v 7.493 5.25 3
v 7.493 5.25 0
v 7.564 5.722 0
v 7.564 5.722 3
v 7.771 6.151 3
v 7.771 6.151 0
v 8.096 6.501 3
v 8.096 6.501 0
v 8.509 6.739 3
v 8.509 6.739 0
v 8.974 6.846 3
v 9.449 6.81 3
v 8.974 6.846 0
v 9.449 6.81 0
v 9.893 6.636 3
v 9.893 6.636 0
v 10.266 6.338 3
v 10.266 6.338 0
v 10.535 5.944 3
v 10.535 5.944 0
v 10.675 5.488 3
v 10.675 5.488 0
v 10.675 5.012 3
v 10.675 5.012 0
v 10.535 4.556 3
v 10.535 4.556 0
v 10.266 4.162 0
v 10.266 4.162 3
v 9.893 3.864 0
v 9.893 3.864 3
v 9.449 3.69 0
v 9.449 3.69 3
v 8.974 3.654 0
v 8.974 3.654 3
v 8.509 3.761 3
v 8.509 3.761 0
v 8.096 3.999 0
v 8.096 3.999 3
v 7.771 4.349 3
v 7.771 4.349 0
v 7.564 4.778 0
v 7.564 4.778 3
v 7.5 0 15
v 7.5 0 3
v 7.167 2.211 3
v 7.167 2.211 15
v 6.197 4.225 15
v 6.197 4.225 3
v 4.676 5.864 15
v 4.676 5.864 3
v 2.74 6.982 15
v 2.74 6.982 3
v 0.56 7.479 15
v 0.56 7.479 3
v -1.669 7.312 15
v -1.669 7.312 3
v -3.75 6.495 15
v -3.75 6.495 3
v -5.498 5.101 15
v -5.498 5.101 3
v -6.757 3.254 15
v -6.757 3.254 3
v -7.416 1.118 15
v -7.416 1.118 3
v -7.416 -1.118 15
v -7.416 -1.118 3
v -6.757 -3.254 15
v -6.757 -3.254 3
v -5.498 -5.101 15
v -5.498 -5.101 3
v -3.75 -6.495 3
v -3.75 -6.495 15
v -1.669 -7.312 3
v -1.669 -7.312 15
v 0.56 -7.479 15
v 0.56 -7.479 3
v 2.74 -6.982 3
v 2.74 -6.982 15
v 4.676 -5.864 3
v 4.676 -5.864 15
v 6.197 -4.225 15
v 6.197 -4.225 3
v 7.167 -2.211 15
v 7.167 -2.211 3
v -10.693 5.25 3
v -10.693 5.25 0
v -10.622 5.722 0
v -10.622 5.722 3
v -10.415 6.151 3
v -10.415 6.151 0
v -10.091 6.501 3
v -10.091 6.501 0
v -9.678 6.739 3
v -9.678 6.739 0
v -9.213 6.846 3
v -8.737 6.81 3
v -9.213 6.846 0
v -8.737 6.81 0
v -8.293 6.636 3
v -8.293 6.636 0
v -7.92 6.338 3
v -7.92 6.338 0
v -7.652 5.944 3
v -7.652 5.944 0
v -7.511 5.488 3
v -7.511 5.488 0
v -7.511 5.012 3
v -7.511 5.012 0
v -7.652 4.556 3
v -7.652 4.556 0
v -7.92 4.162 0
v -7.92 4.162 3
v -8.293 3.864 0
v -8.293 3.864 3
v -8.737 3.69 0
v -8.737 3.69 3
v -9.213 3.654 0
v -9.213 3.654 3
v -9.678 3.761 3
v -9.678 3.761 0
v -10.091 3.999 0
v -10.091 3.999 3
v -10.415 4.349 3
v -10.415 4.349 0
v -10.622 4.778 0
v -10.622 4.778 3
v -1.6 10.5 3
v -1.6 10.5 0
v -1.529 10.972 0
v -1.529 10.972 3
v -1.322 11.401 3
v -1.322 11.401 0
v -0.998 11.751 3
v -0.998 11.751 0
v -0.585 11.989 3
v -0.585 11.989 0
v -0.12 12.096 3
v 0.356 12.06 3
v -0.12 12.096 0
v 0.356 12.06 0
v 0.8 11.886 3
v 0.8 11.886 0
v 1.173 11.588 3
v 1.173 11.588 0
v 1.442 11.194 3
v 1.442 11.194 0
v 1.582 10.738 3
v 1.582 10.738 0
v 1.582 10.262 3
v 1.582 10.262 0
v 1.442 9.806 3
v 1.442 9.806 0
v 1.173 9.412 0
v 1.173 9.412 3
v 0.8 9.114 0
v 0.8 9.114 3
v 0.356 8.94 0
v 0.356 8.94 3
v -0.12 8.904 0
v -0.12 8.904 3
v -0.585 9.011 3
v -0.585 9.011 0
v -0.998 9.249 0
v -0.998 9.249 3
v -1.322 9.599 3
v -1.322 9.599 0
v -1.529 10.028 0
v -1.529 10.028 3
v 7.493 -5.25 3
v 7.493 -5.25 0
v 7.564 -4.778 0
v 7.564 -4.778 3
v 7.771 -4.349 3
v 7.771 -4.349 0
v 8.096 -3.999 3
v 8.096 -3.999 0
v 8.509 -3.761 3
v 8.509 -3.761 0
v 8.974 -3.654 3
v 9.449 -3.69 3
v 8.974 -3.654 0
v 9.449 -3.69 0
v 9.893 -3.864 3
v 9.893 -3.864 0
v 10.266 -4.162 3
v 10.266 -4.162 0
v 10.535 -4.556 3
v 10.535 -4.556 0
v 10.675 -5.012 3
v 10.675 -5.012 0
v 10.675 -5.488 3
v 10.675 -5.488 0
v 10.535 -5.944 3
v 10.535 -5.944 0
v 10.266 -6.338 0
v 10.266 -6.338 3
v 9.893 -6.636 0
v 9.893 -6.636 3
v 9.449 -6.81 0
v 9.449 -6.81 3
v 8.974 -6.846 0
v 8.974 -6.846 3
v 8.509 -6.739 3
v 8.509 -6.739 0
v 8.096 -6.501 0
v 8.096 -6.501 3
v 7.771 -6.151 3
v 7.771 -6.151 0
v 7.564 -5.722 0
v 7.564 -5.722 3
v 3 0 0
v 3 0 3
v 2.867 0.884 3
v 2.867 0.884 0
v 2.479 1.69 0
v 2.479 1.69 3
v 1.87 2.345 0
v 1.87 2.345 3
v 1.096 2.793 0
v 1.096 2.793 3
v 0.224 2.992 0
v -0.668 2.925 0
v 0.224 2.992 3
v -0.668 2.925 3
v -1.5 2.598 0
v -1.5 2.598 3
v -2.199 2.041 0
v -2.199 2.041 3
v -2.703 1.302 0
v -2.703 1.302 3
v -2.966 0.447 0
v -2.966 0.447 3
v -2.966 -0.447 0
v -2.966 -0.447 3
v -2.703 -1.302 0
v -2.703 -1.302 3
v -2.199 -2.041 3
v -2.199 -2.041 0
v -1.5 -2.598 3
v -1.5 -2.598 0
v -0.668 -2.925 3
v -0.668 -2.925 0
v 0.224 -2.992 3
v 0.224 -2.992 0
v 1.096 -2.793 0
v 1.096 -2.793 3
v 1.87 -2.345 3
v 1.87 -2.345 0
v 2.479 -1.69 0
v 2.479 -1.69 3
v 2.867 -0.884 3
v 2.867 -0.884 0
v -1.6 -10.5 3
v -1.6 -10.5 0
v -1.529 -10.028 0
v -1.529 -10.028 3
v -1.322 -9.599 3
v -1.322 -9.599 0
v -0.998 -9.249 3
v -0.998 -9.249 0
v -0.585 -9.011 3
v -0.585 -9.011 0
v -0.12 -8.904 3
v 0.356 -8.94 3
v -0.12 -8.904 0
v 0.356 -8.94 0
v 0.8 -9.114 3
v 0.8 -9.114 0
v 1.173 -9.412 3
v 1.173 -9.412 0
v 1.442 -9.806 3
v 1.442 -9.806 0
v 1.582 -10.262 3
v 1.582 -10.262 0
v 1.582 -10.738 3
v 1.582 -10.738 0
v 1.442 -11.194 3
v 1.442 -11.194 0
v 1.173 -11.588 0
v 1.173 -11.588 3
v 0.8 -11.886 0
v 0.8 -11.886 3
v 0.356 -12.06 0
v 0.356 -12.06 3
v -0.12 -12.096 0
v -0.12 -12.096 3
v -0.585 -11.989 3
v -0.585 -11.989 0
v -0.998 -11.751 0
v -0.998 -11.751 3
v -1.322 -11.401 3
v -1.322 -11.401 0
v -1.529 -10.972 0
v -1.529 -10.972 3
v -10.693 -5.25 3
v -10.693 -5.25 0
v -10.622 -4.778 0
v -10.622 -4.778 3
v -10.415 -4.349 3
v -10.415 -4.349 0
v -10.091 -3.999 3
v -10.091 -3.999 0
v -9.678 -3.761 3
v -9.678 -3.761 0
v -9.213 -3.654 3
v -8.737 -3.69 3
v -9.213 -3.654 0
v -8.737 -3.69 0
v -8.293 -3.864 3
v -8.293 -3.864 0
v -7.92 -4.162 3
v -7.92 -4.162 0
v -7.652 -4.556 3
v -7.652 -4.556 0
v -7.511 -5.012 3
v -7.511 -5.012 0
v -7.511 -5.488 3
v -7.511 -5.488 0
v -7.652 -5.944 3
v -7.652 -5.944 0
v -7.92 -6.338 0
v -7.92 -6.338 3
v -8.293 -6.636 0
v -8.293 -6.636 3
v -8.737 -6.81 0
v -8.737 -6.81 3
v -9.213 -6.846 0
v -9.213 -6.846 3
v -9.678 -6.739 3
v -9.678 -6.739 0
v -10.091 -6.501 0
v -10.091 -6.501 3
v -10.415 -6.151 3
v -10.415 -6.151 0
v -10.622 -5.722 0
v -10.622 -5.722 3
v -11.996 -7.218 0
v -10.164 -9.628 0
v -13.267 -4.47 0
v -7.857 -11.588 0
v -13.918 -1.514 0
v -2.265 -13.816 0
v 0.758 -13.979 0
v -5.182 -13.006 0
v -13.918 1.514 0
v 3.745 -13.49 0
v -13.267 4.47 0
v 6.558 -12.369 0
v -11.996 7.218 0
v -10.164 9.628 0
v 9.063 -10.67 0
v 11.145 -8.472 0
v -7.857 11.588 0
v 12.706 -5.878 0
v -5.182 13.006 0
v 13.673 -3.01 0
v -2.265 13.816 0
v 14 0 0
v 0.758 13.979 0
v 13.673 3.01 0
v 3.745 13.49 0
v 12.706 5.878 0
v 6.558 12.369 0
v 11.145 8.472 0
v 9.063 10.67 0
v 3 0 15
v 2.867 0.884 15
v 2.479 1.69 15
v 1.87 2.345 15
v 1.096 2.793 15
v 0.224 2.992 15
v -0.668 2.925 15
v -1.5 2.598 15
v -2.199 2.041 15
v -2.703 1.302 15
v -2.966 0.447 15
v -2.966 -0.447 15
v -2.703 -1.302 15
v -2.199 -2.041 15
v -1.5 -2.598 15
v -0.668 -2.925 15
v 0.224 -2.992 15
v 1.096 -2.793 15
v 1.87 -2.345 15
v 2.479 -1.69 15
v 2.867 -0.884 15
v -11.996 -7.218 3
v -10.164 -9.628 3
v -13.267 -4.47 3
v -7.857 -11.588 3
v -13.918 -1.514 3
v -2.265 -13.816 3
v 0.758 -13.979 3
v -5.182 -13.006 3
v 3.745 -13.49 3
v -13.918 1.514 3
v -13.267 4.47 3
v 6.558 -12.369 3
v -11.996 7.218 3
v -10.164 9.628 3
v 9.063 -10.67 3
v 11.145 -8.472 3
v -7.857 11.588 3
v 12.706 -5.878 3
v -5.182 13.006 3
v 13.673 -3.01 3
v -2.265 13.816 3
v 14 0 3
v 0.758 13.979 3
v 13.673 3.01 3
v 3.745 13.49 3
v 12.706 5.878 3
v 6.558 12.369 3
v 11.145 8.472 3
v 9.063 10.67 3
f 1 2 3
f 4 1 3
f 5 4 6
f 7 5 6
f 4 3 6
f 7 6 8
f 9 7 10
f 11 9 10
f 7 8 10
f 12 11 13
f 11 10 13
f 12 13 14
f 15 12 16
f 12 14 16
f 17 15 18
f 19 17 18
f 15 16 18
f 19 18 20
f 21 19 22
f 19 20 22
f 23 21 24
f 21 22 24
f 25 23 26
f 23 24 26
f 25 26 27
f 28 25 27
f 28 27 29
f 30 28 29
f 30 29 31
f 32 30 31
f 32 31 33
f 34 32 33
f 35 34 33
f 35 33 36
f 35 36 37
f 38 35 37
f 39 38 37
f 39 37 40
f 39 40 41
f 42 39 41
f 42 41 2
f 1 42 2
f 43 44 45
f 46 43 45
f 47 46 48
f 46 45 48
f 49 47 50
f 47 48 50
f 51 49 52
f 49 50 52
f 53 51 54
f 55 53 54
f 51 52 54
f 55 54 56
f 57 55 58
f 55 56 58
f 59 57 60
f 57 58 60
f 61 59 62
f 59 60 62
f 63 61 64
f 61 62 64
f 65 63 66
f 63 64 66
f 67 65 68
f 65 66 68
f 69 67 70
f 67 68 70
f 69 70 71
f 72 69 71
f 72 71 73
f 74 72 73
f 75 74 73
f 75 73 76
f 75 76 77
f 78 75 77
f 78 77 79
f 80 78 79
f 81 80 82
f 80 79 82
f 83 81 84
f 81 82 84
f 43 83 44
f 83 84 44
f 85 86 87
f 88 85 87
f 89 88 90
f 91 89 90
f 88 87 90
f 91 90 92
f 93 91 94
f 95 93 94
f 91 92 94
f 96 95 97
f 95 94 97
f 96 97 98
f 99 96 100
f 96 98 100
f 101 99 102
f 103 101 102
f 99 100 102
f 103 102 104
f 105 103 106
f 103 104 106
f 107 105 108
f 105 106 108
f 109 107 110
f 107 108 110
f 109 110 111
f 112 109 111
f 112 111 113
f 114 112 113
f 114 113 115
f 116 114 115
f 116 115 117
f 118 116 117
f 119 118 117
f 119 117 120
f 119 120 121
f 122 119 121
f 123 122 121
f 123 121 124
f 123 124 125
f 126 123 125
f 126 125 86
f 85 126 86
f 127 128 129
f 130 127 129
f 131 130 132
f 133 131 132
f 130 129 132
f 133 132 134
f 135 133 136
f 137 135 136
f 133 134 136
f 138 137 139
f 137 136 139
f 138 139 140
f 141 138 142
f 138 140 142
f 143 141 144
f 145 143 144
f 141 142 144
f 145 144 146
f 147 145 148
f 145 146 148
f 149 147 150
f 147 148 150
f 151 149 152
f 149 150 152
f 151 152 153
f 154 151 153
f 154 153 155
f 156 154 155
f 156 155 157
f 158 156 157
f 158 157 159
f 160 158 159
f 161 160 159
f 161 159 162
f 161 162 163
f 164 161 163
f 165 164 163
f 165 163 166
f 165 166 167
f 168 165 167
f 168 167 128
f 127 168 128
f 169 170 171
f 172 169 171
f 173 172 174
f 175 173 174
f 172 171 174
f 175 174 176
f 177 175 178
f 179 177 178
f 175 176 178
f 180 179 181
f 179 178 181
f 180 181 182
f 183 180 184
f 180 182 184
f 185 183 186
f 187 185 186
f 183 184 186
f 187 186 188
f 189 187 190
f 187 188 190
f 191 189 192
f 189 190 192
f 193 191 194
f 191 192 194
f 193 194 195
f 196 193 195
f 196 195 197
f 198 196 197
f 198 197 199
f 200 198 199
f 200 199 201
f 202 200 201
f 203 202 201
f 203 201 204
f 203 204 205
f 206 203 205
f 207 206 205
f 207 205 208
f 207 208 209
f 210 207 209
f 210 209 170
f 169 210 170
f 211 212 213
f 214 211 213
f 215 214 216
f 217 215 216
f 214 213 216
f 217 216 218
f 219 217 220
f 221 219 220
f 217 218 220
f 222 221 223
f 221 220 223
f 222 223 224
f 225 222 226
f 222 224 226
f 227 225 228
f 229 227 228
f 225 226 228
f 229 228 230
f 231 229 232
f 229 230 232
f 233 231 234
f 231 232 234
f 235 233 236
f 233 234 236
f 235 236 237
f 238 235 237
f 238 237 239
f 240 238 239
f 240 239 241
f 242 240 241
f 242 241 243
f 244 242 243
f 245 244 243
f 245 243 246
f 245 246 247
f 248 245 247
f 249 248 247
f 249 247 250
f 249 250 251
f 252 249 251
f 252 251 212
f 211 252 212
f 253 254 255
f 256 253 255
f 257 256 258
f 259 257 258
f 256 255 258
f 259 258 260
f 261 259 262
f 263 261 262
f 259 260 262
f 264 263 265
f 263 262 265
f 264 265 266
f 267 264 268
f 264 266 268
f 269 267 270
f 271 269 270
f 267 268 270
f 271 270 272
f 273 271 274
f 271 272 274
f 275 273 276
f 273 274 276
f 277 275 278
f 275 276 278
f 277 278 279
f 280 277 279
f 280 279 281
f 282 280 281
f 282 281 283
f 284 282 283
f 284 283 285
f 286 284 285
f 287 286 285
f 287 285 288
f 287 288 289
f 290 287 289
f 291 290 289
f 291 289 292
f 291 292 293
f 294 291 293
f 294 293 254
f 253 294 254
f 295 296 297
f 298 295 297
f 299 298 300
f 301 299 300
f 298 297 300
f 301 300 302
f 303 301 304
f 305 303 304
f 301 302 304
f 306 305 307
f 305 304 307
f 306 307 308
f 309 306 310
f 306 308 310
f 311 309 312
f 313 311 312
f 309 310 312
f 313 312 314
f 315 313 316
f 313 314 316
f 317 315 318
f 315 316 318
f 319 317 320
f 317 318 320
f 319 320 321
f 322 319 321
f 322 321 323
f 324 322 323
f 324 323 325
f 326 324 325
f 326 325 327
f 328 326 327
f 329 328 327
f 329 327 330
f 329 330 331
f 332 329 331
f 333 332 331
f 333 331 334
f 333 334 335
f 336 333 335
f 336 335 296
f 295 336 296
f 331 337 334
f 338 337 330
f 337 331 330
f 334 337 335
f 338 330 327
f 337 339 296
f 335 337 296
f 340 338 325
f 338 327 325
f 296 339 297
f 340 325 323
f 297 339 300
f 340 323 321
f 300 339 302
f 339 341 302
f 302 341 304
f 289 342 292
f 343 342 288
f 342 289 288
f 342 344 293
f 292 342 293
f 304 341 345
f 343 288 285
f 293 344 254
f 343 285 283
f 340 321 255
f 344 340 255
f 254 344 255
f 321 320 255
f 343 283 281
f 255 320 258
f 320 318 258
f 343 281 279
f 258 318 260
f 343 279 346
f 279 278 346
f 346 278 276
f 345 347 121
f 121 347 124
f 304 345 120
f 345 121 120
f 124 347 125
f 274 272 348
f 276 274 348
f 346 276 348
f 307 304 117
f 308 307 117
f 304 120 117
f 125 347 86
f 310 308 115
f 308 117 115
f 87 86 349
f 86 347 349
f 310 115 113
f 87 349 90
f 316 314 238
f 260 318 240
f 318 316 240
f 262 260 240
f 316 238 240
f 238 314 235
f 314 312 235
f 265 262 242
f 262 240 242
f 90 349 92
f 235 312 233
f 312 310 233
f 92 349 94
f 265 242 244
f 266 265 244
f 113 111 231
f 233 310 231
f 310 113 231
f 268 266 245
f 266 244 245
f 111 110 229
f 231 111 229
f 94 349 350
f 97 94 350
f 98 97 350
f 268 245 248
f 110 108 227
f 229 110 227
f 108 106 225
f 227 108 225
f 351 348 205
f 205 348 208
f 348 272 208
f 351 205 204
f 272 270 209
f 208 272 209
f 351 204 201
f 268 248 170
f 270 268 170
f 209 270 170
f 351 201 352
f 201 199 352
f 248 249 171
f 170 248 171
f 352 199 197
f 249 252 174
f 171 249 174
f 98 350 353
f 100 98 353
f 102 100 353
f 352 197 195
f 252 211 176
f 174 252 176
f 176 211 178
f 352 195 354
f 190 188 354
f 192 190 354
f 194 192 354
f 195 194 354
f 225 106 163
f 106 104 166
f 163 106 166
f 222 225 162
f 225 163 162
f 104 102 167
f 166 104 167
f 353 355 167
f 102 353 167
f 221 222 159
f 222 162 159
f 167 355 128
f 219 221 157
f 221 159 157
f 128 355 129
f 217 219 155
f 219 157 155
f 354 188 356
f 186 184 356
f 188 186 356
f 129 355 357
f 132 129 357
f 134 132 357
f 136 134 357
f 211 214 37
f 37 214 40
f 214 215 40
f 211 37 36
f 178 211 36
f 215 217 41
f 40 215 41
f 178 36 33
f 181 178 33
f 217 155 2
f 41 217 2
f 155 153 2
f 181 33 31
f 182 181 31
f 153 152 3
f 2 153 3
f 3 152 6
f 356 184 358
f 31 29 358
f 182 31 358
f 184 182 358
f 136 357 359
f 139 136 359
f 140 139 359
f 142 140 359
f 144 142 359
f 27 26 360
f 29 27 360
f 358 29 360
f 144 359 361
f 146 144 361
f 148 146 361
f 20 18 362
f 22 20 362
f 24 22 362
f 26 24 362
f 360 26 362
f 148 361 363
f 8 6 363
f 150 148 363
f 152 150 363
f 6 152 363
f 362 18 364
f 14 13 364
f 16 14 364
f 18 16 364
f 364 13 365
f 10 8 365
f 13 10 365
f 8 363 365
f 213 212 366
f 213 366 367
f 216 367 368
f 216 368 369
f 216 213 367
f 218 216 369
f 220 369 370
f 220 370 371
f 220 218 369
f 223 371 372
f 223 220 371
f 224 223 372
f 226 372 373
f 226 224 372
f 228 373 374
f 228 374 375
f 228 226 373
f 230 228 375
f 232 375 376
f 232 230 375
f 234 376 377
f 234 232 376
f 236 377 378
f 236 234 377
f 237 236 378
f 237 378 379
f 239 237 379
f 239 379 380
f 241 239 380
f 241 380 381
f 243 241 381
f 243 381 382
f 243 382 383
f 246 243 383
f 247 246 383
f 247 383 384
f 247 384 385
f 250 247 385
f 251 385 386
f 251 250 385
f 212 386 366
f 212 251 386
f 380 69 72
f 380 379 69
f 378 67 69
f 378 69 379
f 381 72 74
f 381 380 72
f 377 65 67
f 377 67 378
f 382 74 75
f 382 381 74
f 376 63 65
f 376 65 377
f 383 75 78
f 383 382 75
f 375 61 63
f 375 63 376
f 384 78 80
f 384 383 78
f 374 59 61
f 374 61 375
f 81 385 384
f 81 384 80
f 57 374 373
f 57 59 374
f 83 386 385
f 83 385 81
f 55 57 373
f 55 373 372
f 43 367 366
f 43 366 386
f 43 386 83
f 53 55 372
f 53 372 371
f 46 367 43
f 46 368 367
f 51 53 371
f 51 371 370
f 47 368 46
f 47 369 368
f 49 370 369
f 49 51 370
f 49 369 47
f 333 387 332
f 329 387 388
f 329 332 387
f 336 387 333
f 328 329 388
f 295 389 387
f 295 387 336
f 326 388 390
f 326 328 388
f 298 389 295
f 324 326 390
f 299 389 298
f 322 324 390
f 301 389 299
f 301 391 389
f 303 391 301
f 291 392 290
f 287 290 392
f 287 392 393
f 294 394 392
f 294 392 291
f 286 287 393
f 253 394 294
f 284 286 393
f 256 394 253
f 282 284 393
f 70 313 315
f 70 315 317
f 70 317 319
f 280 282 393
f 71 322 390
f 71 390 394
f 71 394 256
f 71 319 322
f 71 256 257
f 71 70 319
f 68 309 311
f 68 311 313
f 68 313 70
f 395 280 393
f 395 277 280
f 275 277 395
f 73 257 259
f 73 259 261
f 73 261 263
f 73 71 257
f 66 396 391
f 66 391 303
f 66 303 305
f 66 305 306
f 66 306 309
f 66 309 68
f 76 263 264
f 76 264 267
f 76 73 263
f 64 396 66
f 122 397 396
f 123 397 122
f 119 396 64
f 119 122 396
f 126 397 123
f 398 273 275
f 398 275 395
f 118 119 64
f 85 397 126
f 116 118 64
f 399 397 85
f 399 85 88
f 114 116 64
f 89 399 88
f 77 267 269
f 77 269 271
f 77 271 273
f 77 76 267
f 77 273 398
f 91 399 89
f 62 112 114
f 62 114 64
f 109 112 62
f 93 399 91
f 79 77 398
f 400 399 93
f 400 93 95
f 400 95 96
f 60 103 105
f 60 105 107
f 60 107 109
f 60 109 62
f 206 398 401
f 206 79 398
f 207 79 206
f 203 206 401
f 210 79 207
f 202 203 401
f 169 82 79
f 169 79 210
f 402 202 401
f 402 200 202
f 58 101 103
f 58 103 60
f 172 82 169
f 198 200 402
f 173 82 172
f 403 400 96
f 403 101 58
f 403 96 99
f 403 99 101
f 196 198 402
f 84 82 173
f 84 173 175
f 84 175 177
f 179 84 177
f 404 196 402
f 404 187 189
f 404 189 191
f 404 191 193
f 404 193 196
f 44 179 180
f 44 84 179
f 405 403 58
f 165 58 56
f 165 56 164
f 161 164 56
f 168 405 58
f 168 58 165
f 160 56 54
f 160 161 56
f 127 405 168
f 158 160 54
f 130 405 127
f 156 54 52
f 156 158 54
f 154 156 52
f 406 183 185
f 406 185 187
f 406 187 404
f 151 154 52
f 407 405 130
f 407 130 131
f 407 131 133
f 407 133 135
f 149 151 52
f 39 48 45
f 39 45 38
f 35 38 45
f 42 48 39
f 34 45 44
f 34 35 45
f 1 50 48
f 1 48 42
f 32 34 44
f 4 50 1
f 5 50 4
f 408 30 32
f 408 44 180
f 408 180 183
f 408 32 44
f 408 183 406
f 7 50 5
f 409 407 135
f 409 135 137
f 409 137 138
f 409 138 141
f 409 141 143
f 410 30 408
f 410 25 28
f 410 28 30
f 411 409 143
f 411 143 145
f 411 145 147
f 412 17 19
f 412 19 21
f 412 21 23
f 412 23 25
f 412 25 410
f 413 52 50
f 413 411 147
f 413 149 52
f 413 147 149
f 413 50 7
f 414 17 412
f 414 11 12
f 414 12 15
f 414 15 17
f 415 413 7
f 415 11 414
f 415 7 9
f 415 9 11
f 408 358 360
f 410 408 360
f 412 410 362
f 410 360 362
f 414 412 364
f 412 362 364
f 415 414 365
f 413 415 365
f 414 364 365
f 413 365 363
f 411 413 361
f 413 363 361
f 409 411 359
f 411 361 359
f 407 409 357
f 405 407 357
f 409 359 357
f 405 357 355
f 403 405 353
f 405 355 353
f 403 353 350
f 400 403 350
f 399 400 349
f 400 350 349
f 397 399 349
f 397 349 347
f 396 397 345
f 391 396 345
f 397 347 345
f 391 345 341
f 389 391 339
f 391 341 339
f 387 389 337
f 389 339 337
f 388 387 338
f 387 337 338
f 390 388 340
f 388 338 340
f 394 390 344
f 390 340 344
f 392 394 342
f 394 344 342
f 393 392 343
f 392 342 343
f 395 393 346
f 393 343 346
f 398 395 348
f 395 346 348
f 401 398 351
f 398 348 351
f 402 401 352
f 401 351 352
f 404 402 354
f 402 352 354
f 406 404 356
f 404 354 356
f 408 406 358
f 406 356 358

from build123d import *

# Parameters (mm, degrees)
SKETCH_1_R          = 14
EXTRUDE_1_DEPTH     = 3
SKETCH_2_R          = 7.5
SKETCH_2_R_2        = 3
EXTRUDE_2_DEPTH     = 12
SKETCH_3_R          = 3
CUT_EXTRUDE_1_DEPTH = 4
SKETCH_4_R          = 1.6
CUT_EXTRUDE_2_DEPTH = 16


with BuildPart() as part:
    # 草图1 → 凸台-拉伸1 (new body)
    with BuildSketch(Plane.XY):
        Circle(SKETCH_1_R)
    extrude(amount=EXTRUDE_1_DEPTH)

    # 草图2 → 凸台-拉伸2 (add)
    with BuildSketch(Plane.XY.offset(3)):
        Circle(SKETCH_2_R)
        Circle(SKETCH_2_R_2, mode=Mode.SUBTRACT)
    extrude(amount=EXTRUDE_2_DEPTH)

    # 草图3 → 切除-拉伸1 (cut, through all)
    with BuildSketch(Plane.XY.offset(3)):
        Circle(SKETCH_3_R)
    extrude(amount=-CUT_EXTRUDE_1_DEPTH, mode=Mode.SUBTRACT)

    # 草图4 → 切除-拉伸2 (cut, through all)
    with BuildSketch(Plane(origin=(0, 0, 0), x_dir=(-1, 0, 0), z_dir=(0, 0, -1))):
        with Locations((-9.09326674, -5.25)):
            Circle(SKETCH_4_R)
        with Locations((9.09326674, 5.25)):
            Circle(SKETCH_4_R)
        with Locations((0, -10.5)):
            Circle(SKETCH_4_R)
        with Locations((9.09326674, -5.25)):
            Circle(SKETCH_4_R)
        with Locations((0, 10.5)):
            Circle(SKETCH_4_R)
        with Locations((-9.09326674, 5.25)):
            Circle(SKETCH_4_R)
    extrude(amount=-CUT_EXTRUDE_2_DEPTH, mode=Mode.SUBTRACT)


solid = part.part
